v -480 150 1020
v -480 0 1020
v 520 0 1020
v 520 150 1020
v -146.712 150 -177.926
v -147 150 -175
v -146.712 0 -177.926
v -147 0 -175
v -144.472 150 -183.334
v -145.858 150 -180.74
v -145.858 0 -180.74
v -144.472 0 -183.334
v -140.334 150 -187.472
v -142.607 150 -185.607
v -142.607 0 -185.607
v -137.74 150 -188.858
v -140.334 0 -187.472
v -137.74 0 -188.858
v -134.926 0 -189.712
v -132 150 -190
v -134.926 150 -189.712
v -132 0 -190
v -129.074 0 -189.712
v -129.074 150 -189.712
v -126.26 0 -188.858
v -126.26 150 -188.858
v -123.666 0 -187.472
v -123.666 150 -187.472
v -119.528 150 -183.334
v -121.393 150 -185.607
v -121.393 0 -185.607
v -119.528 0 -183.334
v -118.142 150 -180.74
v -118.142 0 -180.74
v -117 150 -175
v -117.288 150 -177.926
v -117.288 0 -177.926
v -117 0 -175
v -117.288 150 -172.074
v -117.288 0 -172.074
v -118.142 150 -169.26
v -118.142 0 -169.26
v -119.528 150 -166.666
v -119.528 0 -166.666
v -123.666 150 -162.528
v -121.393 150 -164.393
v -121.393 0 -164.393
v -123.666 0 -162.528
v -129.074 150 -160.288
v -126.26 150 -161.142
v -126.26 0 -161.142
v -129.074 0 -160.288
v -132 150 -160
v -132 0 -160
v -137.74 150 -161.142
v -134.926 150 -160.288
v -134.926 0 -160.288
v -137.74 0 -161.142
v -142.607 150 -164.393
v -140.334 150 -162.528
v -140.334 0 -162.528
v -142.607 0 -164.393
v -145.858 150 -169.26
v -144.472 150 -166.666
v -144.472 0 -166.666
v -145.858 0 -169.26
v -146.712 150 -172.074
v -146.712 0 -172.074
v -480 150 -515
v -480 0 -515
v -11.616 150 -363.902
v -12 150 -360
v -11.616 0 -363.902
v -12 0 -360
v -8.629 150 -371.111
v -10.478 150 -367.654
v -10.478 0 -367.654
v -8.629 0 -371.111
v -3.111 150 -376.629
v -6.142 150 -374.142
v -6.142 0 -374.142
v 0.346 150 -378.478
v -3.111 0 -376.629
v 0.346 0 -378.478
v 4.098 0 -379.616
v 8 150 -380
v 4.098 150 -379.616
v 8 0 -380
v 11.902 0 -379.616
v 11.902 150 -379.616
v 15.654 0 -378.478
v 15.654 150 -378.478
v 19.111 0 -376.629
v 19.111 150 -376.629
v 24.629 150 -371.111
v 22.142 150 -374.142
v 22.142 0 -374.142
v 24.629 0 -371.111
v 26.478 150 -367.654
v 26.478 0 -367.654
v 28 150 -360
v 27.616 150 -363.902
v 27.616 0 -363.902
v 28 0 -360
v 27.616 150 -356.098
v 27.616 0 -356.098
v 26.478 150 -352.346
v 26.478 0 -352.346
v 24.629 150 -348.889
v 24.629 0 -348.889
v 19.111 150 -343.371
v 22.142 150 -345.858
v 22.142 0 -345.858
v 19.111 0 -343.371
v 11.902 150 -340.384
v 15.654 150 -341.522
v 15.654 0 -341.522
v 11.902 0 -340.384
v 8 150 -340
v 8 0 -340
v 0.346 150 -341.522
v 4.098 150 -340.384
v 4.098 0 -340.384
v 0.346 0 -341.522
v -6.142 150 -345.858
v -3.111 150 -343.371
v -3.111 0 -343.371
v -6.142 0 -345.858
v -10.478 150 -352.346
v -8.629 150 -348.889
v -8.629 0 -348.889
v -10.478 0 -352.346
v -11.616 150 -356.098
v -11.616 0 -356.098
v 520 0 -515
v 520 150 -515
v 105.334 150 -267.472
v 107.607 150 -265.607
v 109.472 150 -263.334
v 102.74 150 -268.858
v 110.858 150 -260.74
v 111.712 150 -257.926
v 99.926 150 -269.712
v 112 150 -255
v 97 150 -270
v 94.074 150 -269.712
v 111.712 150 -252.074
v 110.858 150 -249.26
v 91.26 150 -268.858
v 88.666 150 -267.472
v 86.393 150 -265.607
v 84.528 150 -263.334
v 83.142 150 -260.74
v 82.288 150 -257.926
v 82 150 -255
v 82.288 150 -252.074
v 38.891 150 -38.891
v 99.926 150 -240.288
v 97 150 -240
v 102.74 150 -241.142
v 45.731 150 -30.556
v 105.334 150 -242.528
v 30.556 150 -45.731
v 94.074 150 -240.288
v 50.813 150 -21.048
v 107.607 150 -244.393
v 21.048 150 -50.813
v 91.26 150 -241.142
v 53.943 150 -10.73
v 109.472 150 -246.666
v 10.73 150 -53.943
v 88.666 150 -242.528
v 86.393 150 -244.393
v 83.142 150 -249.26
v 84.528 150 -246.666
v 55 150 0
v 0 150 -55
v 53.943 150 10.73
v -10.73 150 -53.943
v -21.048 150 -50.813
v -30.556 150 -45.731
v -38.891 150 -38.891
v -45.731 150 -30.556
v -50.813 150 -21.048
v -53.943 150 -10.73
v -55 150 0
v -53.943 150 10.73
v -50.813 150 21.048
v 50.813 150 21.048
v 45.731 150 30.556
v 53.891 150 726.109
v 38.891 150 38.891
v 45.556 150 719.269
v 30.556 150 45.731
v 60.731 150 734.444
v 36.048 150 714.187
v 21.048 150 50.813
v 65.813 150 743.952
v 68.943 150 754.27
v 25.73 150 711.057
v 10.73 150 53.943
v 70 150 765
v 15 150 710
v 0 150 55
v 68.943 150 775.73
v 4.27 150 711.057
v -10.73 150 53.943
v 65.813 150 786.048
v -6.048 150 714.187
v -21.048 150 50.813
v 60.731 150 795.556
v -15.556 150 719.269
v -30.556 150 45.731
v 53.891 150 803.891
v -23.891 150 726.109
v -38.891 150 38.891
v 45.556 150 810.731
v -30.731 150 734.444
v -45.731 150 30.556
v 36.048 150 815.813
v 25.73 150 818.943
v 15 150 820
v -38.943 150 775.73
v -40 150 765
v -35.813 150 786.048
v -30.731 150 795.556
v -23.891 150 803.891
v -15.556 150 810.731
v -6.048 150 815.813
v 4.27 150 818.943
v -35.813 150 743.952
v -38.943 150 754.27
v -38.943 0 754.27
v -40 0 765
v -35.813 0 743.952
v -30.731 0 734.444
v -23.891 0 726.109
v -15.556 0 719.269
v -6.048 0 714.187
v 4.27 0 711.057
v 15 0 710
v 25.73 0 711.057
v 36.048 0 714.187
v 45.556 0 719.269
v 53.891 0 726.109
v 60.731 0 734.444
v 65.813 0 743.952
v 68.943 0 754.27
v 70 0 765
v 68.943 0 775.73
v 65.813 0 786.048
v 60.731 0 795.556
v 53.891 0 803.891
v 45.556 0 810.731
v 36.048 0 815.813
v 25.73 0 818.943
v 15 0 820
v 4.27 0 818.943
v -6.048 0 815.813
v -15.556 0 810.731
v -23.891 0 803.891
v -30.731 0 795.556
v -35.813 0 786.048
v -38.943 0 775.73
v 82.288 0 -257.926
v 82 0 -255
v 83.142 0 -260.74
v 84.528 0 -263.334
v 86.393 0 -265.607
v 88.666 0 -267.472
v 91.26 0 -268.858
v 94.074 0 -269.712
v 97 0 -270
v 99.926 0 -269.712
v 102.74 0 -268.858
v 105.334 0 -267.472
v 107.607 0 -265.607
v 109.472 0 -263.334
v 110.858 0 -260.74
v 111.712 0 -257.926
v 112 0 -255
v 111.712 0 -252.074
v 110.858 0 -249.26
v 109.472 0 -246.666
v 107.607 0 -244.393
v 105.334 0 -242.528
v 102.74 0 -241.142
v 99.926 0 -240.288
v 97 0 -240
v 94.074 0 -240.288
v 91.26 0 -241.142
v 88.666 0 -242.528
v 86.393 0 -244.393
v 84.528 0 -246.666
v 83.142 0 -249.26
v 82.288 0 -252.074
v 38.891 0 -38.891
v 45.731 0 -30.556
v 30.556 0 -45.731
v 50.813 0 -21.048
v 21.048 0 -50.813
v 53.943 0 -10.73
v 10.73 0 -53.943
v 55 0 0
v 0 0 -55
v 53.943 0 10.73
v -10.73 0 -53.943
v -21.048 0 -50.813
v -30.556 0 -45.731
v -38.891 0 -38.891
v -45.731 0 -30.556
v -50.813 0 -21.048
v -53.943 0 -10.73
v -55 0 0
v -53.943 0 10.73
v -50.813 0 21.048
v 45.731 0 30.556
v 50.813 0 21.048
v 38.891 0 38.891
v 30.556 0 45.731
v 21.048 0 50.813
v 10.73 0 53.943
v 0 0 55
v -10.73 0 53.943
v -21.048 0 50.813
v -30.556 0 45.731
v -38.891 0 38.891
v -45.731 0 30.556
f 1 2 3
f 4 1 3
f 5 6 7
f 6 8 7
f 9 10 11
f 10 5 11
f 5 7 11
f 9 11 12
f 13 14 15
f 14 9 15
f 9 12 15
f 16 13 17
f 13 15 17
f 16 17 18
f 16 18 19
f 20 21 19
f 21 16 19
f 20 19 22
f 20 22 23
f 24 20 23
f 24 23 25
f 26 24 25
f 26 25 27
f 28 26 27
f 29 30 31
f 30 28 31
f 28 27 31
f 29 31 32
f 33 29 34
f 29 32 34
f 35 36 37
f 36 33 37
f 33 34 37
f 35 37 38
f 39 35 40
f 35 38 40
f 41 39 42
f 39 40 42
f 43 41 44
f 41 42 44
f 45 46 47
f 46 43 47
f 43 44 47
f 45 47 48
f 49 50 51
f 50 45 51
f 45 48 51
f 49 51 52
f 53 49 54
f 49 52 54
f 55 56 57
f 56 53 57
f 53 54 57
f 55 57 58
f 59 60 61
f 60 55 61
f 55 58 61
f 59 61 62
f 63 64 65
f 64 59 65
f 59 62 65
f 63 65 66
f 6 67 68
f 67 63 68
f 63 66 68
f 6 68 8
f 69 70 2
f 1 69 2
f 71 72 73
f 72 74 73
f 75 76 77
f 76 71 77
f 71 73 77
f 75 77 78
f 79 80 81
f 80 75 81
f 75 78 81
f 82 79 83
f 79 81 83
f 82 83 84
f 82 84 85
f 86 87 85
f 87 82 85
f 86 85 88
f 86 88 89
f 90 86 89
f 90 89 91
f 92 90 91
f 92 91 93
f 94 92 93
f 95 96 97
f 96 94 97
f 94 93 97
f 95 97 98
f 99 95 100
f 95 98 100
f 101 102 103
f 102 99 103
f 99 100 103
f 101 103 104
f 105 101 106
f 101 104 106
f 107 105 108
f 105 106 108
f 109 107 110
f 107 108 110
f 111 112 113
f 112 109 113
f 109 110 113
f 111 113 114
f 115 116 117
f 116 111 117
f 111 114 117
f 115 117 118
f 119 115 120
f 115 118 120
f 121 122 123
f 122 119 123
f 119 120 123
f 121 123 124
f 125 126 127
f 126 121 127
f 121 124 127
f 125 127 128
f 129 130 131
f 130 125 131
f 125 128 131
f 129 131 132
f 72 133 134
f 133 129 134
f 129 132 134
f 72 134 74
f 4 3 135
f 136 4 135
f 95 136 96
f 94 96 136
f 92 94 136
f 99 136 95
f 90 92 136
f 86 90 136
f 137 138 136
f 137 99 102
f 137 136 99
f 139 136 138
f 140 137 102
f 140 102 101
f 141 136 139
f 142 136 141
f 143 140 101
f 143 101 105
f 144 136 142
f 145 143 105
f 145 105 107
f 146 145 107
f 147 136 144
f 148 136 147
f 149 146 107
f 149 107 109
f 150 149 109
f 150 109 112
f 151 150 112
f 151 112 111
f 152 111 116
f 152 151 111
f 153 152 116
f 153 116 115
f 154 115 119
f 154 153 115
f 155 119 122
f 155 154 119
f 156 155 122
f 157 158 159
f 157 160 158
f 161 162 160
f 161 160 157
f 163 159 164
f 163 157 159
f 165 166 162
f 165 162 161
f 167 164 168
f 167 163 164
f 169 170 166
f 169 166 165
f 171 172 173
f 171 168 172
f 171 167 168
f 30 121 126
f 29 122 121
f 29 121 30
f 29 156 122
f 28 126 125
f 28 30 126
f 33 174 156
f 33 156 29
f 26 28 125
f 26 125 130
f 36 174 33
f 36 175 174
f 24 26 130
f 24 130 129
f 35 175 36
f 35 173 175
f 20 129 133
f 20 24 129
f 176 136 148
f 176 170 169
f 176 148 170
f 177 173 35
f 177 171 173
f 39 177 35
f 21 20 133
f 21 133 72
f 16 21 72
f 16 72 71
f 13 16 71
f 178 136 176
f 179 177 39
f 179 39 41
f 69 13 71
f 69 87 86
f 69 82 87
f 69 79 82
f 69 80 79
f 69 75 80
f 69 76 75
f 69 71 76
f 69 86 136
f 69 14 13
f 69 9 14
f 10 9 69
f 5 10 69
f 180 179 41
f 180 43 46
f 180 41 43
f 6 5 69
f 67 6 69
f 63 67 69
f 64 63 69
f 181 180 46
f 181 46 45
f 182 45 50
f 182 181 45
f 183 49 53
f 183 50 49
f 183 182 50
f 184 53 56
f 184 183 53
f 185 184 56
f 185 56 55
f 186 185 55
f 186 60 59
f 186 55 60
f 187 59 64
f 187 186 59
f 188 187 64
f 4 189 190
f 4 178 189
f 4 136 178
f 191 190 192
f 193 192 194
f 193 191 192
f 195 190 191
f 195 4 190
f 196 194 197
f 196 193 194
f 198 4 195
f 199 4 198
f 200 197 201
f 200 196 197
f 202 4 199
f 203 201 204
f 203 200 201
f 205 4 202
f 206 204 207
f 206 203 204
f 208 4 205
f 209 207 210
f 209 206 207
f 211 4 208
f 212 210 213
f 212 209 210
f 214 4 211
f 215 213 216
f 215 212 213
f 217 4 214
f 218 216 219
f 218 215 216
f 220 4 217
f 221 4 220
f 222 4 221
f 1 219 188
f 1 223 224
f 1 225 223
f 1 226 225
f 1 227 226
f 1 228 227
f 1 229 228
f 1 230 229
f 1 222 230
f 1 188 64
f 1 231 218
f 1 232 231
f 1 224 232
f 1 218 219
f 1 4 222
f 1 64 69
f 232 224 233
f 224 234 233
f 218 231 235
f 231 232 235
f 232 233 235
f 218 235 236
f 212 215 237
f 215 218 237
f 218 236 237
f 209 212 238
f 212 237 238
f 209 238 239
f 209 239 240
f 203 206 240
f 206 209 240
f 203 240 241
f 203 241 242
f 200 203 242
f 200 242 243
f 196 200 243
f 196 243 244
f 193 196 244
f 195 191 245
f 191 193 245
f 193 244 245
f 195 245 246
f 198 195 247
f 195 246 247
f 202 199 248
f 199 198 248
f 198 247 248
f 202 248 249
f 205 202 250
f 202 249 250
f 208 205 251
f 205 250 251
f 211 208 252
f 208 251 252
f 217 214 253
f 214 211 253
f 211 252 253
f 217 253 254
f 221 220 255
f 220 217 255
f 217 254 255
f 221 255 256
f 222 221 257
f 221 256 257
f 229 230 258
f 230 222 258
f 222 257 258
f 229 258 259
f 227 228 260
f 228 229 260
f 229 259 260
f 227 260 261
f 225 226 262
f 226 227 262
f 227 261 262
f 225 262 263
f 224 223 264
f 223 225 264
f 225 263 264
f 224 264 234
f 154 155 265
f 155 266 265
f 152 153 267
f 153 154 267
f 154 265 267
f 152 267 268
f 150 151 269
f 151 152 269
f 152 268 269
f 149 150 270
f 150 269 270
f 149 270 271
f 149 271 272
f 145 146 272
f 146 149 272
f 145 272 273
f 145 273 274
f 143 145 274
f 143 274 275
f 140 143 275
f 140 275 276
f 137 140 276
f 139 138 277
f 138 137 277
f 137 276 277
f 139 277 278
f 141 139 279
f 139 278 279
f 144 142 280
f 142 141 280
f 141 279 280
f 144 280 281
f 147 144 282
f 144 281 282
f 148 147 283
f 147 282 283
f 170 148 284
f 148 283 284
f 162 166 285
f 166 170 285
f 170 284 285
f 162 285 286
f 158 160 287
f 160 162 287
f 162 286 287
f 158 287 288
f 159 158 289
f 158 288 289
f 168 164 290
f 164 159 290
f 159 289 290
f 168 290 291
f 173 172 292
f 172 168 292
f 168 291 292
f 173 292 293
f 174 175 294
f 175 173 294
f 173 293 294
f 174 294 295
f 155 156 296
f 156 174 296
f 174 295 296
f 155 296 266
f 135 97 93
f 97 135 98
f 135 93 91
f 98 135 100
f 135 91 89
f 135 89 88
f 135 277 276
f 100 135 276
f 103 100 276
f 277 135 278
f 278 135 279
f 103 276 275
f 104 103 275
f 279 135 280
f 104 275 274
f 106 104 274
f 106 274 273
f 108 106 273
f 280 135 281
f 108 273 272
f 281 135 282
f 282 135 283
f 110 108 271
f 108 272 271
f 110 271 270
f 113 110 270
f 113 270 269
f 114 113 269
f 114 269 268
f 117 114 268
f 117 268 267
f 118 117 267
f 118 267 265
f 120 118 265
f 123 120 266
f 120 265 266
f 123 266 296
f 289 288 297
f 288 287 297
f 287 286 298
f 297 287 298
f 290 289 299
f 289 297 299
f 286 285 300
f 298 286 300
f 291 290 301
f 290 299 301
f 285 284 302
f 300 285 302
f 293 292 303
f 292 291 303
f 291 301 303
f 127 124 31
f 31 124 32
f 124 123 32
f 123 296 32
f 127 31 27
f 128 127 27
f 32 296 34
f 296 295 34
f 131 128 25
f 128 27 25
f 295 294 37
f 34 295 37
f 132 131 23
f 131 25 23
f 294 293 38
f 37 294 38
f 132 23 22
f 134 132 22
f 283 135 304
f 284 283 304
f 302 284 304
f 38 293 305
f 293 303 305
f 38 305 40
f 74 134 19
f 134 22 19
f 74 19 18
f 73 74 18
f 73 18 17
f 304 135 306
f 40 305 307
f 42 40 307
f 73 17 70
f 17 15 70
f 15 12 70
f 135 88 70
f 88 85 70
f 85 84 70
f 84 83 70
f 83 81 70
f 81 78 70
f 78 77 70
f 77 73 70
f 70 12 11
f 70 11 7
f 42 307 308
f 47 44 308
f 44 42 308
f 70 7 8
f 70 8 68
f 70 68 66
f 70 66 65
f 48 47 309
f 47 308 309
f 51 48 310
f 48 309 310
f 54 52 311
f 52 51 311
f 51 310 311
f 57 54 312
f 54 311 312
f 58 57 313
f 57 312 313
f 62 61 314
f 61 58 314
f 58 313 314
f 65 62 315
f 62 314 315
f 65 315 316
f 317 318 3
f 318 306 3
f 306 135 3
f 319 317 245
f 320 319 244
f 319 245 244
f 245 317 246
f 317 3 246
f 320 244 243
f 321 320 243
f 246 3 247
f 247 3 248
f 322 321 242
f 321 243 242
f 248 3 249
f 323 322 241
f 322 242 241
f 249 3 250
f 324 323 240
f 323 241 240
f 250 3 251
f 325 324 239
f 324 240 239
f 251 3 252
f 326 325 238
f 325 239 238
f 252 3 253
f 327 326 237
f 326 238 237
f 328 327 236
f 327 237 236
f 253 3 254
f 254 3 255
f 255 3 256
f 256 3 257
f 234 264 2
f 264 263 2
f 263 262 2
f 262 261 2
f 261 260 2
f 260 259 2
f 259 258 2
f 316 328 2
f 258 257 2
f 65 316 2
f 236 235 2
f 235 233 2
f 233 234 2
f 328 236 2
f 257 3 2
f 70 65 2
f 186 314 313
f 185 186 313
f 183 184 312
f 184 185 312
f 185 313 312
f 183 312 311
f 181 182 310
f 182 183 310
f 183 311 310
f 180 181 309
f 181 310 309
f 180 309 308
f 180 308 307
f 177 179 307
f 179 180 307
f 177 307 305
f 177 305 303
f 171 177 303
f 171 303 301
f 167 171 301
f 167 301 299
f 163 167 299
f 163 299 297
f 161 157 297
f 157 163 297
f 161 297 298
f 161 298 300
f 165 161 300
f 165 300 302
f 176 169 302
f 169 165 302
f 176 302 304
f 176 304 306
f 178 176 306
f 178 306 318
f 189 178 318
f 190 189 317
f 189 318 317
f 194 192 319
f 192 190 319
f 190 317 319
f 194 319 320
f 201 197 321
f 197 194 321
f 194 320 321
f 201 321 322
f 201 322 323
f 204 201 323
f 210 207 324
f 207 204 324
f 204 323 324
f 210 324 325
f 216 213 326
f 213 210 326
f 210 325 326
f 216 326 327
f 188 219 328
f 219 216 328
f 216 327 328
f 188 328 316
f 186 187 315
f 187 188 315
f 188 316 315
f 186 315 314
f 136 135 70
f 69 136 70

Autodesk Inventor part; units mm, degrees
ref_plane "YZ Plane" through (0, 0, 0) normal (1, 0, 0) x (0, 1, 0)
ref_plane "XZ Plane" through (0, 0, 0) normal (0, 1, 0) x (-1, 0, 0)
ref_plane "XY Plane" through (0, 0, 0) normal (0, 0, 1) x (1, 0, 0)
sketch "Sketch1" plane through (0, 0, 0) normal (0, 1, 0) x (-1, 0, 0)
  circle A0 centre (0, 0) radius 55
  line L0 (480, 1020) -> (-520, 1020)
  line L1 (-520, 1020) -> (-520, -515)
  line L2 (-520, -515) -> (480, -515)
  line L3 (480, -515) -> (480, 1020)
  line L4 (267, -266) -> (-327, -266) construction
  circle A1 centre (132, -175) radius 15
  circle A2 centre (-97, -255) radius 15
  circle A3 centre (-8, -360) radius 20
  circle A4 centre (-15, 765) radius 55
  dimension "d0" = 110
  dimension "d1" = 515
  dimension "d2" = 1020
  dimension "d3" = 520
  dimension "d4" = 480
  dimension "d5" = 30
  dimension "d6" = 30
  dimension "d7" = 40
  dimension "d8" = 155
  dimension "d9" = 255
  dimension "d10" = 340
  dimension "d11" = 110
  dimension "d13" = 505
  dimension "d14" = 765
extrude "Extrusion1" add sketch "Sketch1" along normal blind 150
properties part number "protoPlinth"
